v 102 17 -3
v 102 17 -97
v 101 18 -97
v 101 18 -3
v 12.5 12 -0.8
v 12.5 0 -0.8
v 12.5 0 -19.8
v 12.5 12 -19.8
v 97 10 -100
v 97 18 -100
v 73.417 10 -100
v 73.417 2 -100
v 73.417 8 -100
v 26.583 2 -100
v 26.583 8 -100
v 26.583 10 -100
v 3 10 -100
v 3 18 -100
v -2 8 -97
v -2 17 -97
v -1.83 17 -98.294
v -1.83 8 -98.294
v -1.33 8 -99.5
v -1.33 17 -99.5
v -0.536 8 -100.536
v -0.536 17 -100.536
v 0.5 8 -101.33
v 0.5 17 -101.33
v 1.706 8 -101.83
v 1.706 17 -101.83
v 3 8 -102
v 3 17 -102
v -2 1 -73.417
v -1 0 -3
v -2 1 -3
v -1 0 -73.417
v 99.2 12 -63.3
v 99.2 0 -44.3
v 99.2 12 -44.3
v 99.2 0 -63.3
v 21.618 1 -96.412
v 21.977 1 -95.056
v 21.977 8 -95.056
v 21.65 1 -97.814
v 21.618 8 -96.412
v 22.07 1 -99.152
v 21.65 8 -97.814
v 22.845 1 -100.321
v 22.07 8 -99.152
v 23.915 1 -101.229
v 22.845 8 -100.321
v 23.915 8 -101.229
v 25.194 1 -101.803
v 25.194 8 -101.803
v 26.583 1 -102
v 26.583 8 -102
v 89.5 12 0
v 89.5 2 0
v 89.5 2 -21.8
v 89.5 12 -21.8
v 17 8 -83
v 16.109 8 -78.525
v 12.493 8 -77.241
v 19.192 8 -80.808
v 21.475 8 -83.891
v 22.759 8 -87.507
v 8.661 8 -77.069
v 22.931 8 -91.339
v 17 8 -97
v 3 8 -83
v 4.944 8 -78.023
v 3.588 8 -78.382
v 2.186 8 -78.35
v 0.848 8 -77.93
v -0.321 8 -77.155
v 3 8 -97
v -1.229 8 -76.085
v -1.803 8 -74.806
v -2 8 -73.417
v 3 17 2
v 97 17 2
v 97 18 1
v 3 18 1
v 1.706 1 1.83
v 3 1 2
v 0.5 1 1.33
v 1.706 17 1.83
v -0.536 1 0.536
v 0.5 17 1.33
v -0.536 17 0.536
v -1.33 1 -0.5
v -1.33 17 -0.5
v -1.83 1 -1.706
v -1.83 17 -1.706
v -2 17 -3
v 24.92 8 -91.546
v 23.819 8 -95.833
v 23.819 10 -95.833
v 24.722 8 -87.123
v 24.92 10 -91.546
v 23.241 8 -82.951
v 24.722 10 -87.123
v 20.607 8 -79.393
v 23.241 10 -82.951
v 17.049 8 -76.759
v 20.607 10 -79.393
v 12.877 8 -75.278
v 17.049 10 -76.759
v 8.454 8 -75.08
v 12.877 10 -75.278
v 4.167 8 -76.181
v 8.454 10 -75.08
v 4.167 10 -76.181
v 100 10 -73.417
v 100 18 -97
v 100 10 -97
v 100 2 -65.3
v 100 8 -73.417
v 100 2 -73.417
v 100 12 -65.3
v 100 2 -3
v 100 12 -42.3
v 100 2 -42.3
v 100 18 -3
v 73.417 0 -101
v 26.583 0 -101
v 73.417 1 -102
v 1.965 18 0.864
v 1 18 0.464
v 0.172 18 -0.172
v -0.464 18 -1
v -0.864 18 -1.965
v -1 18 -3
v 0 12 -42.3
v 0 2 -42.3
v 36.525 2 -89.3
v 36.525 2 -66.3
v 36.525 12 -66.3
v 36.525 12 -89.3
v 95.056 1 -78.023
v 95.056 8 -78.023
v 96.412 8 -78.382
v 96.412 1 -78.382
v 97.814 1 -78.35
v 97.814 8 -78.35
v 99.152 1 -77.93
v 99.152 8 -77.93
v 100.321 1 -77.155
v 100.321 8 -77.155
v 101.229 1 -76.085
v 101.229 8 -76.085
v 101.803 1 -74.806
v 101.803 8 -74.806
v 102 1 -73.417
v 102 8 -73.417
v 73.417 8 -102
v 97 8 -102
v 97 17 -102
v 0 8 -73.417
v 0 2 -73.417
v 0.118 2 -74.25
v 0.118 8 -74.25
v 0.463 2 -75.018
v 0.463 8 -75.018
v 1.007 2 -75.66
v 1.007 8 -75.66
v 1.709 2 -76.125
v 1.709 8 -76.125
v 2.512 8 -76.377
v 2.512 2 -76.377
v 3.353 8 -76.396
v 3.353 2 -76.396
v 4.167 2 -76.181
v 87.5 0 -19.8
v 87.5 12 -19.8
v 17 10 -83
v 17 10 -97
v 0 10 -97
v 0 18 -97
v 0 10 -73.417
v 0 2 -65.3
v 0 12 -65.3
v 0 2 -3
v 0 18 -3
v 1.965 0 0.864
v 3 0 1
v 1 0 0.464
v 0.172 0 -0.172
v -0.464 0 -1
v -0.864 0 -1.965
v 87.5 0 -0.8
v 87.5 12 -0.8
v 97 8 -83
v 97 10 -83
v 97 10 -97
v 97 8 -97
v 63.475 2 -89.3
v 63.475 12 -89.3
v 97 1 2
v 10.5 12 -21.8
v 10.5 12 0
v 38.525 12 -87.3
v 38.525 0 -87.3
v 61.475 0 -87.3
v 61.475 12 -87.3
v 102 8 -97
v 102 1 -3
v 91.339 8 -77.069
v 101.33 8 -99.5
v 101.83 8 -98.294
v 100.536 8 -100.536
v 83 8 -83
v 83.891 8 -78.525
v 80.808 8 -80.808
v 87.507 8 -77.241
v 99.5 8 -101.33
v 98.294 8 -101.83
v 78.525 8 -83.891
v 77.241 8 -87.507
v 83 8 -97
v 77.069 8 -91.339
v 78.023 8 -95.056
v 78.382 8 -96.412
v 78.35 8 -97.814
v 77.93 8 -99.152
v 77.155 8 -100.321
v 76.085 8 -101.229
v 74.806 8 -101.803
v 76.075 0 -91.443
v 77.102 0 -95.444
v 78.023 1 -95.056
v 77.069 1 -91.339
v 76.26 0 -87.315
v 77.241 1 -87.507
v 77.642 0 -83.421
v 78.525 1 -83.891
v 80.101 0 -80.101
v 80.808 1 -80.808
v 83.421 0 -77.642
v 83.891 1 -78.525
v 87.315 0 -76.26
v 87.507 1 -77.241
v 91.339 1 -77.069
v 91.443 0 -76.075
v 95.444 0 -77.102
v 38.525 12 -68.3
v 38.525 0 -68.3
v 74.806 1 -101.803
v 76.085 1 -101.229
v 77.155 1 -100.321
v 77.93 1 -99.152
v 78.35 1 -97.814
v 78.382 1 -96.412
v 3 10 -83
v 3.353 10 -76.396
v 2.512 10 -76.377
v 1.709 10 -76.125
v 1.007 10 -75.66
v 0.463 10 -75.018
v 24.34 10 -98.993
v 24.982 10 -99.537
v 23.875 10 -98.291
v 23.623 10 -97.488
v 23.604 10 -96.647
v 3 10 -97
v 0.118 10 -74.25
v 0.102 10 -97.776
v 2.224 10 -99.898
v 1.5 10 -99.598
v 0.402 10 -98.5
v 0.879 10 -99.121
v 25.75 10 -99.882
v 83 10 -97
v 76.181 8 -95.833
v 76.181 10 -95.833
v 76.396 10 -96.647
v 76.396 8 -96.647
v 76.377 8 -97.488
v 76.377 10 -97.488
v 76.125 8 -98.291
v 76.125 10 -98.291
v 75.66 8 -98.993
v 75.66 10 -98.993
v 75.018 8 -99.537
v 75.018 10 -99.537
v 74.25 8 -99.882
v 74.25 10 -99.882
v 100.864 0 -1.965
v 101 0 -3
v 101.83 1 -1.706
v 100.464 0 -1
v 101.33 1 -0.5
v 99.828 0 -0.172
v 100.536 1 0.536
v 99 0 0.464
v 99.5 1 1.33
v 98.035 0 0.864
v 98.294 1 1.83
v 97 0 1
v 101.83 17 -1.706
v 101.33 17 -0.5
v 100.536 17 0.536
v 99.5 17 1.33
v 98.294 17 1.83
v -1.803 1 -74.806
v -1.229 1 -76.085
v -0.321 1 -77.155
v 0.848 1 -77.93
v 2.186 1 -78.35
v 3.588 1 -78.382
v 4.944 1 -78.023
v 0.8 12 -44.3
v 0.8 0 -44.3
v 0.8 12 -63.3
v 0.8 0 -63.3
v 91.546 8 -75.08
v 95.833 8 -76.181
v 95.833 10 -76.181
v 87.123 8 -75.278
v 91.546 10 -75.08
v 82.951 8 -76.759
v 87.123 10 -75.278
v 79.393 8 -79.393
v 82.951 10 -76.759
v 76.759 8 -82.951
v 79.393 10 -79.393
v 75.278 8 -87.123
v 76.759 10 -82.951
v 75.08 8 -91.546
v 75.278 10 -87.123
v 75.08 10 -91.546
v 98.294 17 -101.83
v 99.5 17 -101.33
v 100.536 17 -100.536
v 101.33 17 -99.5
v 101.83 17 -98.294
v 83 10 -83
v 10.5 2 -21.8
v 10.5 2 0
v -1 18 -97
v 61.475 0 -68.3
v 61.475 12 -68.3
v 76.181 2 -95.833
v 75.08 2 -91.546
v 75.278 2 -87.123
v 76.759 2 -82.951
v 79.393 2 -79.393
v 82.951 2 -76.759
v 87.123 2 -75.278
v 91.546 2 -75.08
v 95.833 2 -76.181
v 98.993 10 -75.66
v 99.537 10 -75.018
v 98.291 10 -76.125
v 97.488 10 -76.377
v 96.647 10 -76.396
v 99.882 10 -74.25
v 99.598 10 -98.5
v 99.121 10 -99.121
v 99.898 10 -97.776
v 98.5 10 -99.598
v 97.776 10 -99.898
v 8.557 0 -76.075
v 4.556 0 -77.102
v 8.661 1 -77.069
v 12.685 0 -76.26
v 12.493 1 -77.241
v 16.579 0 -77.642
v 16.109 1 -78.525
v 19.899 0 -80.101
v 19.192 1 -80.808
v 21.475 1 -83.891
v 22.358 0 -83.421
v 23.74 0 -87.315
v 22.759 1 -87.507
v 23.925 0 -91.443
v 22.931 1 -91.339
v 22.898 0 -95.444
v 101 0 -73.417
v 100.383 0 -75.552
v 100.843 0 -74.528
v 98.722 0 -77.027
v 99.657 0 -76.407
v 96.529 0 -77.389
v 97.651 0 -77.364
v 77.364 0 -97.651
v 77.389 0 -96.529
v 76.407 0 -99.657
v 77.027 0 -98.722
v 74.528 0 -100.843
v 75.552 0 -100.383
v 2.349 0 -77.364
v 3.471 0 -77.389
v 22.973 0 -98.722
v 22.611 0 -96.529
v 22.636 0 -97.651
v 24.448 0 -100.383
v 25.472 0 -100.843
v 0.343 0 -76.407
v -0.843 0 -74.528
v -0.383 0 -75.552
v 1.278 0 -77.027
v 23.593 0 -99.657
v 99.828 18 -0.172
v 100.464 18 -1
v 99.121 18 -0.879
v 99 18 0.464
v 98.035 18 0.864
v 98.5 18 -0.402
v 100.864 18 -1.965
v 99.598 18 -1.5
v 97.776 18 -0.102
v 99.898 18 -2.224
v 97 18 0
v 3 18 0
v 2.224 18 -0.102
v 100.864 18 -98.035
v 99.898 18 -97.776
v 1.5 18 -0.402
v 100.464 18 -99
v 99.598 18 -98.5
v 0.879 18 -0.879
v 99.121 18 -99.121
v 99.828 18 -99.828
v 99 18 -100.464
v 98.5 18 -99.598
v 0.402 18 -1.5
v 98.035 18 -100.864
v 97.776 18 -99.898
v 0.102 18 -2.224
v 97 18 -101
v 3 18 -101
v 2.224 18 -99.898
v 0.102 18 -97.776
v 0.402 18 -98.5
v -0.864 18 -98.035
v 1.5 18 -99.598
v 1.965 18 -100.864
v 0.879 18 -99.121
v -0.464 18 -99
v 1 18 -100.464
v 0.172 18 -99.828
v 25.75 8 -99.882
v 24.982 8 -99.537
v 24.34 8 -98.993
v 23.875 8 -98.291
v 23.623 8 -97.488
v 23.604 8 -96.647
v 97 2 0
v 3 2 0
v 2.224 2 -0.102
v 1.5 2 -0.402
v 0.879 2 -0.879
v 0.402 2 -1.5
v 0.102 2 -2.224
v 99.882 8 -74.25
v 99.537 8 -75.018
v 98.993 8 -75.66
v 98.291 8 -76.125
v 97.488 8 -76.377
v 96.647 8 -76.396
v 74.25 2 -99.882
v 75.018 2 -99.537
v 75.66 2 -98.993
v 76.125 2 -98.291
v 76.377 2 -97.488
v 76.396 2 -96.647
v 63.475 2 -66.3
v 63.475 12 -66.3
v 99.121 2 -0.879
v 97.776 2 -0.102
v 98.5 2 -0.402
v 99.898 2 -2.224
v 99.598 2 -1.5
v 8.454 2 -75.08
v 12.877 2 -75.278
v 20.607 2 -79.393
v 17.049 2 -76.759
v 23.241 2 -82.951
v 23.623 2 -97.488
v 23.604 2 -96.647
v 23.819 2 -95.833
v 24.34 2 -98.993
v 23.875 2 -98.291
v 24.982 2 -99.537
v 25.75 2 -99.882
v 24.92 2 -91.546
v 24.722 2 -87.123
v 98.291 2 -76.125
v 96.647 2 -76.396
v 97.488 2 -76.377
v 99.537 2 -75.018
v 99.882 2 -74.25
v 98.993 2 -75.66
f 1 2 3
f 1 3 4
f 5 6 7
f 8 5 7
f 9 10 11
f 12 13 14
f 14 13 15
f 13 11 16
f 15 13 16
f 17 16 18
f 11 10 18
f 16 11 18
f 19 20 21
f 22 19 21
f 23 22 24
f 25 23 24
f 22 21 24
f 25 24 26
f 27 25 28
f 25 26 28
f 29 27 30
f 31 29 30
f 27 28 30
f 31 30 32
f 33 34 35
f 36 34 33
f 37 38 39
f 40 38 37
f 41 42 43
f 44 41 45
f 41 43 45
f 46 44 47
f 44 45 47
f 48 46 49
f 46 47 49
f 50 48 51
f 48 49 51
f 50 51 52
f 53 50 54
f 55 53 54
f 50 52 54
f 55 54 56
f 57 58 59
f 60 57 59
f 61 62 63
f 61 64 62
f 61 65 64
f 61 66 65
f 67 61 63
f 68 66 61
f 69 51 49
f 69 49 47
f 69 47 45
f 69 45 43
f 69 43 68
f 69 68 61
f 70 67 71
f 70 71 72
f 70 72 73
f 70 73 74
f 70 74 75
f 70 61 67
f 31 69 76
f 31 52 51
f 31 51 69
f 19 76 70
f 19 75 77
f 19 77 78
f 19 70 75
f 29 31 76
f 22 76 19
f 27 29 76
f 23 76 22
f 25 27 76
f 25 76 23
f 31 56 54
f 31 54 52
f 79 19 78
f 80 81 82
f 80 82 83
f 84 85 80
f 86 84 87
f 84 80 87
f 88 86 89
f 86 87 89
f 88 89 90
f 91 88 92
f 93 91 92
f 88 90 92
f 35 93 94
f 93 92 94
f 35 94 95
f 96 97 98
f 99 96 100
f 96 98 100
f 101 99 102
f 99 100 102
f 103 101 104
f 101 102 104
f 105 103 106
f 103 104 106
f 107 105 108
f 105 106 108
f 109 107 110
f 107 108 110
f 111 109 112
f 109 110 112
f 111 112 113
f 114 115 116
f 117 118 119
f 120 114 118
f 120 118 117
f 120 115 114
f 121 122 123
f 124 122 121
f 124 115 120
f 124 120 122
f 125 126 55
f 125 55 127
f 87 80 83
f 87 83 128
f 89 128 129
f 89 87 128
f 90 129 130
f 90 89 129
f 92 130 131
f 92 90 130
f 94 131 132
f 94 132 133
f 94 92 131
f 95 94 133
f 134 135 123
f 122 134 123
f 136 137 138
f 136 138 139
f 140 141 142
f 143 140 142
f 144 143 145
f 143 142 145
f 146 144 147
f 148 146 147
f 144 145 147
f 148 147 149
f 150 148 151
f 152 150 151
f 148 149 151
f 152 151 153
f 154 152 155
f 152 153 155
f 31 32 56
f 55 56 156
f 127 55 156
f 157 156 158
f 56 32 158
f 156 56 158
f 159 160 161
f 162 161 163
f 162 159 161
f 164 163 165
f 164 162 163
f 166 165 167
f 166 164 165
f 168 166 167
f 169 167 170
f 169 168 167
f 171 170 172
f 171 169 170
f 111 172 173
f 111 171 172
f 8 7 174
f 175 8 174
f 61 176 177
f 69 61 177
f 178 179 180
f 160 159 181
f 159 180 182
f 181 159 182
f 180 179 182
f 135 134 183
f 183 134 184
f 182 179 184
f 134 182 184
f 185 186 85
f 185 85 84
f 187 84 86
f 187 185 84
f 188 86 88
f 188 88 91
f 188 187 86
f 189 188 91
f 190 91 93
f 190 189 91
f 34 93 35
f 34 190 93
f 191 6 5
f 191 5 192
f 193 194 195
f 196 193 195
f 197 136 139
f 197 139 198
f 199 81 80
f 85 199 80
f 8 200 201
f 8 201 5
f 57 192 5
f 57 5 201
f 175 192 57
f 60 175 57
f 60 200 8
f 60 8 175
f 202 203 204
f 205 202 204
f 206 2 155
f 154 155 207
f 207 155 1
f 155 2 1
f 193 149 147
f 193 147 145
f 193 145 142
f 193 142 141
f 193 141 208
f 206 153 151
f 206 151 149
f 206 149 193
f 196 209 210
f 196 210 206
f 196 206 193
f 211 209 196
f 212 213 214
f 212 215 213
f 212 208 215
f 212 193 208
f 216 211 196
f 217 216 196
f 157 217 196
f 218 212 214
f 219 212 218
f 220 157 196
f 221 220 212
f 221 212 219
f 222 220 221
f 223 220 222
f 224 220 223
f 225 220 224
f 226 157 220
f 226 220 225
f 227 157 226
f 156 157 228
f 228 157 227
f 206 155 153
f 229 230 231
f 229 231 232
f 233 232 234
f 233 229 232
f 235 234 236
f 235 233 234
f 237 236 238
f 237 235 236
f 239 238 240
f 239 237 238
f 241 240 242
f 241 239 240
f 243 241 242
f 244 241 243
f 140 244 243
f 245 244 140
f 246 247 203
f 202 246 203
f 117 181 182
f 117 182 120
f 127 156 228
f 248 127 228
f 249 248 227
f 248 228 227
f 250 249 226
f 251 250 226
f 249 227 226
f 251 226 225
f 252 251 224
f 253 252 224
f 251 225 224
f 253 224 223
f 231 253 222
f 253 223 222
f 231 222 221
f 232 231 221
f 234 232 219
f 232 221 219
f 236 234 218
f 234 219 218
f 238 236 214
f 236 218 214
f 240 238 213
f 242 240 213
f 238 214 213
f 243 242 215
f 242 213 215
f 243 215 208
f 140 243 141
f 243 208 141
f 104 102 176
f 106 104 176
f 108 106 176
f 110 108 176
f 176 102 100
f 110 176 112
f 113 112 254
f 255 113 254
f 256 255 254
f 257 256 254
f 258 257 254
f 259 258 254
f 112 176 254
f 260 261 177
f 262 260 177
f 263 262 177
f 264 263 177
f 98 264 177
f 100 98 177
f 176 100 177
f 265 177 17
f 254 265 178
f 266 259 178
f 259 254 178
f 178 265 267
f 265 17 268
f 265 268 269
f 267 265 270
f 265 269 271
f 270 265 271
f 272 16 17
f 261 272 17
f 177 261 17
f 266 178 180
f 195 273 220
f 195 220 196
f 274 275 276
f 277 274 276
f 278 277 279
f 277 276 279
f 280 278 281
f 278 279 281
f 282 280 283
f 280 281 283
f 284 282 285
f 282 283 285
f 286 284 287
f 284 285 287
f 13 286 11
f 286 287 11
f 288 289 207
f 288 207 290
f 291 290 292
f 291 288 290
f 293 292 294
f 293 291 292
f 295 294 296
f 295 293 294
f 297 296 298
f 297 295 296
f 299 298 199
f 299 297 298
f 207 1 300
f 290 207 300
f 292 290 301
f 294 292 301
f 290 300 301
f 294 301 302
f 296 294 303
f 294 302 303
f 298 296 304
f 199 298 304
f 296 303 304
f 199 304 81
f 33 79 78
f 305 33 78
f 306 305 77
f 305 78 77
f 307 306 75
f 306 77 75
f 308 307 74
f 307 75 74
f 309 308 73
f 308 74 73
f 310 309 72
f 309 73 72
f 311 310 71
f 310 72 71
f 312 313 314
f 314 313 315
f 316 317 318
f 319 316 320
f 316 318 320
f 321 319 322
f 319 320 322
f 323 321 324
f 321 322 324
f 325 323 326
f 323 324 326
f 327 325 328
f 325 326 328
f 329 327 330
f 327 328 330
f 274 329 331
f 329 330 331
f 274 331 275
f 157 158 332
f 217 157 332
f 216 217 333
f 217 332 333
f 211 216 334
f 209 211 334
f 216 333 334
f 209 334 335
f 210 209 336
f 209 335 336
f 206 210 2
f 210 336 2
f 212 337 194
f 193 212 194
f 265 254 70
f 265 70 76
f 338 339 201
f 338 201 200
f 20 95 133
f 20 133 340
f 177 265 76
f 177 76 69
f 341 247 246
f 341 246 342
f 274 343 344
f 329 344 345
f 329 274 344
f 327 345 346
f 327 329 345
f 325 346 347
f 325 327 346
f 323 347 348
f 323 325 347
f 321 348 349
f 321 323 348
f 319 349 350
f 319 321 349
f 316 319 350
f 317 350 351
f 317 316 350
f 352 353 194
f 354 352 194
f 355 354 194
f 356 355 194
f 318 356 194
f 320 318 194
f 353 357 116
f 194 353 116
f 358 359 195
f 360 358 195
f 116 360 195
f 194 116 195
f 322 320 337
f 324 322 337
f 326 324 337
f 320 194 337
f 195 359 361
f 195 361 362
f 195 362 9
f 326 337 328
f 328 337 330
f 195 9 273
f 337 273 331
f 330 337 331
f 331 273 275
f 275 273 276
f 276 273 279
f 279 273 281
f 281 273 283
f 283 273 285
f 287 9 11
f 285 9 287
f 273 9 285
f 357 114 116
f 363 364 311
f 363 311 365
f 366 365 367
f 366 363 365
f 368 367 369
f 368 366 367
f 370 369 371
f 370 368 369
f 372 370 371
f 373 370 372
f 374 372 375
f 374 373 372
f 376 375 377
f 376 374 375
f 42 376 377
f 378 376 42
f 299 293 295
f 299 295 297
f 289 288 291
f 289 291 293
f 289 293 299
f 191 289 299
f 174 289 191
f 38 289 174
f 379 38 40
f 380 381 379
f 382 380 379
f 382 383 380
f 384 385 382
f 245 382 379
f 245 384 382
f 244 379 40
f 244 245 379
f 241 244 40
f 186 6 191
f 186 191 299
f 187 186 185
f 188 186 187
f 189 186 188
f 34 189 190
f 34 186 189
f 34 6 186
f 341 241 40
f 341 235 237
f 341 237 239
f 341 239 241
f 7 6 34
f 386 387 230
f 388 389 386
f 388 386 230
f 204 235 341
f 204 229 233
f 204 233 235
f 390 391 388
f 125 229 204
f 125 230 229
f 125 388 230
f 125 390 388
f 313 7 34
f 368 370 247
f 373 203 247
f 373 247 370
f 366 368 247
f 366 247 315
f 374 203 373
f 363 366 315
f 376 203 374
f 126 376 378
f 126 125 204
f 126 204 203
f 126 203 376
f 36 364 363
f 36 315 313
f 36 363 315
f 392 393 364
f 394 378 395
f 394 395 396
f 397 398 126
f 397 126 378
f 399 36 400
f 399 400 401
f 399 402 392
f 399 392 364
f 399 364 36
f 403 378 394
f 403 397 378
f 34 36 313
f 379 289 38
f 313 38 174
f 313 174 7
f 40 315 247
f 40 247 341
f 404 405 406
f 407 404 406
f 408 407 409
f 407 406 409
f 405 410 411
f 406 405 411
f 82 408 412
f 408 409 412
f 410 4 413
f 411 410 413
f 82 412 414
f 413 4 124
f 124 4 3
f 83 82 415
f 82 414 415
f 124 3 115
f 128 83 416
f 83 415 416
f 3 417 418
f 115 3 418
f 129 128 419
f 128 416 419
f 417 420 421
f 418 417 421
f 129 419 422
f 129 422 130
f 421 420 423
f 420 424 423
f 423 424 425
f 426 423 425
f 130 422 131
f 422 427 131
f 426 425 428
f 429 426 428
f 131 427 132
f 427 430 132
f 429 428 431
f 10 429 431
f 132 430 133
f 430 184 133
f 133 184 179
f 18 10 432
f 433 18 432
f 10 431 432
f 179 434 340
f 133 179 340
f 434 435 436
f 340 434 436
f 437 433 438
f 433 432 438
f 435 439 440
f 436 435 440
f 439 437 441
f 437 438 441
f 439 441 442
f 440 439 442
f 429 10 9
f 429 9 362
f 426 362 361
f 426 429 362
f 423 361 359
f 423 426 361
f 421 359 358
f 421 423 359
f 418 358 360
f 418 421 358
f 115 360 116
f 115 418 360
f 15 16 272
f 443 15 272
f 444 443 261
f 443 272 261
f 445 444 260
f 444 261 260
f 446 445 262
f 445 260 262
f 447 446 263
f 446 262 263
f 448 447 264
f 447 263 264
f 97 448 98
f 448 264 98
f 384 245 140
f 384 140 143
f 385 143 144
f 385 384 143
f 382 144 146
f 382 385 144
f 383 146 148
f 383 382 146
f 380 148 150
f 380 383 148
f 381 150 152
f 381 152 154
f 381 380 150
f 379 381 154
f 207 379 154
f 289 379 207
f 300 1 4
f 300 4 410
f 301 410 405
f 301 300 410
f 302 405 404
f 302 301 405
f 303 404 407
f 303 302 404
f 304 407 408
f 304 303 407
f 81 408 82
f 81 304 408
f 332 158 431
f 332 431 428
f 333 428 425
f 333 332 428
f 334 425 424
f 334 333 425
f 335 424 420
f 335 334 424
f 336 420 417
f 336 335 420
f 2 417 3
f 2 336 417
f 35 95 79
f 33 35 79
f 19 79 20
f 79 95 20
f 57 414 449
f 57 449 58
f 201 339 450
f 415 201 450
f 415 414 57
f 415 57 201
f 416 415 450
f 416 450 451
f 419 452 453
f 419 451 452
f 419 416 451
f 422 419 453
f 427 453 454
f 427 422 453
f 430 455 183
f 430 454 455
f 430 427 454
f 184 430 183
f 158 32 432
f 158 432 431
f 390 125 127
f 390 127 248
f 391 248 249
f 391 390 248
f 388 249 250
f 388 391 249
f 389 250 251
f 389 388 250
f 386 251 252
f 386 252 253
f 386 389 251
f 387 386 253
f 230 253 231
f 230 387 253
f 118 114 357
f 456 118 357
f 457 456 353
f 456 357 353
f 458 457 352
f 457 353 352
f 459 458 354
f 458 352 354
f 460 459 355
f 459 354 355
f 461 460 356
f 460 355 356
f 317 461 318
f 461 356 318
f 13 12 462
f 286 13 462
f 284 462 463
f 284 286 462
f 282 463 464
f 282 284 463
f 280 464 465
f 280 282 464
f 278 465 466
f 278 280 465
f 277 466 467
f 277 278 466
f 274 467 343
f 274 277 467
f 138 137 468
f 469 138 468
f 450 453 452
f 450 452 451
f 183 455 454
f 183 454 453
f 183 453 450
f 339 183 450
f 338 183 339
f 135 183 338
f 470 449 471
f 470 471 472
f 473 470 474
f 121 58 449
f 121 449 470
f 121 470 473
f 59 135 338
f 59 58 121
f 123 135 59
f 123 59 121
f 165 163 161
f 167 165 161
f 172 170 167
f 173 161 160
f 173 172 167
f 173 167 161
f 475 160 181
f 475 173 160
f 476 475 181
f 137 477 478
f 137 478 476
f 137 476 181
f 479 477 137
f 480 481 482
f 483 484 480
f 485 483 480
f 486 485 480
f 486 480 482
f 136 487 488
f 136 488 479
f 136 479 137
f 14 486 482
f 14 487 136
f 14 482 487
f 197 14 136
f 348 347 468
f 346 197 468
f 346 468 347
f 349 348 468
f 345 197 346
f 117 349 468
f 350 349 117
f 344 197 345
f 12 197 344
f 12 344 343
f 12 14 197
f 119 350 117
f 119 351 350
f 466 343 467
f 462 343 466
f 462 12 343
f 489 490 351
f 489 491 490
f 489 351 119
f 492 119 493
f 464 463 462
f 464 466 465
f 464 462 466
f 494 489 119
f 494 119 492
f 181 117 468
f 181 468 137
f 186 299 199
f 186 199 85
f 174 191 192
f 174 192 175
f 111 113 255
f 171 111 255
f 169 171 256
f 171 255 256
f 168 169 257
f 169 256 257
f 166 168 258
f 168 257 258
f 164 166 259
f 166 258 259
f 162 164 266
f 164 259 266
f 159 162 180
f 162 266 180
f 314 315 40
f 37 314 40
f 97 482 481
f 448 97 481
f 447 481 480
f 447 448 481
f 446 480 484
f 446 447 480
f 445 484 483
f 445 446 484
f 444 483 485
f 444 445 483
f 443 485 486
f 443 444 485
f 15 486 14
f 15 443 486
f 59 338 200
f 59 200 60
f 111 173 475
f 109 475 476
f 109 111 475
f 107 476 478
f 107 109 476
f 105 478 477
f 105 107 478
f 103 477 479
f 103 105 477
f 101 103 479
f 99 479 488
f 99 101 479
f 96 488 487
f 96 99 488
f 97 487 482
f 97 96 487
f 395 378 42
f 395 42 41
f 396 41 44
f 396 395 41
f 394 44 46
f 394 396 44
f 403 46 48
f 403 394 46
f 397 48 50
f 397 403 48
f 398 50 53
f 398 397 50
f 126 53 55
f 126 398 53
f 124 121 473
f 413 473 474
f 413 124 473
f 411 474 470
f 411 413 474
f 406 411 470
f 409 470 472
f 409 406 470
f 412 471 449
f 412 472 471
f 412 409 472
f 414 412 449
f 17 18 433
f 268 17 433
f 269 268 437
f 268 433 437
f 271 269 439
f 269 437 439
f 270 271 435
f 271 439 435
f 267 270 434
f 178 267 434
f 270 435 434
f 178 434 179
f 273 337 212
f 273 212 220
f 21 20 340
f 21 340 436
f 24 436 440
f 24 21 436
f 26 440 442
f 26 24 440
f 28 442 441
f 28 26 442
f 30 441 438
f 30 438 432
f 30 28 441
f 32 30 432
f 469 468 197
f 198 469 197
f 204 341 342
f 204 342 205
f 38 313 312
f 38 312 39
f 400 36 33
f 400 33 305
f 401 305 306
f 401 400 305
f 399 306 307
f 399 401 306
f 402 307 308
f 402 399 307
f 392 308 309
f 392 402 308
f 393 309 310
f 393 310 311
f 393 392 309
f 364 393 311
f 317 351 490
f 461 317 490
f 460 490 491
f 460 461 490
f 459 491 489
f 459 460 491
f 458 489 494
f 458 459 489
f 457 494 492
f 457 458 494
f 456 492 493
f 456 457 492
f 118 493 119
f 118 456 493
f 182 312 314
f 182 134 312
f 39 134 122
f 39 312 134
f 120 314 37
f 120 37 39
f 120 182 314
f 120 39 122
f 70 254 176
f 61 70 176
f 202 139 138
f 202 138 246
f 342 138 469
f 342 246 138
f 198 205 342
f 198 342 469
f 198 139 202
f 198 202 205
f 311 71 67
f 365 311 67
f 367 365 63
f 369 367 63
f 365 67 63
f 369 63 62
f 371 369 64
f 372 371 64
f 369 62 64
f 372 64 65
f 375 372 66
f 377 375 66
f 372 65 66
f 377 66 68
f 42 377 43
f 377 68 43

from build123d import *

# Parameters (mm, degrees)
SKETCH_1_W          = 22.95
SKETCH_1_H          = 19
SKETCH_1_W_2        = 75
SKETCH_1_W_3        = 98.4
EXTRUDE_7_DEPTH     = 2
SKETCH_4_R          = 15
CUT_EXTRUDE_1_DEPTH = 18
FILLET_1_R          = 3
FILLET_2_R          = 3
SKETCH_1_6_W        = 26.95
SKETCH_1_6_H        = 23
SKETCH_1_6_W_2      = 22.95
SKETCH_1_6_H_2      = 19
EXTRUDE_3_DEPTH     = 12
SKETCH_1_7_W        = 102.4
SKETCH_1_7_H        = 23
SKETCH_1_7_W_2      = 98.4
SKETCH_1_7_H_2      = 19
EXTRUDE_4_DEPTH     = 12
SKETCH_1_8_W        = 79
SKETCH_1_8_H        = 23
SKETCH_1_8_W_2      = 75
SKETCH_1_8_H_2      = 19
EXTRUDE_5_DEPTH     = 12
EXTRUDE_START       = 16
EXTRUDE_7_2_DEPTH   = 18
SKETCH_11_W         = 28.583123952
SKETCH_11_H         = 28.583123952
CUT_EXTRUDE_8_DEPTH = 10
EXTRUDE_START_2     = 2
SKETCH_13_W         = 14
SKETCH_13_H         = 14
EXTRUDE_8_DEPTH     = 2
SKETCH_15_W         = 14
SKETCH_15_H         = 14
EXTRUDE_9_DEPTH     = 2
EXTRUDE_START_3     = 8
EXTRUDE_12_DEPTH    = 8
CHAMFER_1_SIZE      = 1
CHAMFER_2_SIZE      = 1


with BuildPart() as part:
    # 草图1 → Extrude 7 (new body)
    with BuildSketch(Plane(origin=(0, 0, 0), x_dir=(1, 0, 0), z_dir=(0, 1, 0))):
        with BuildLine():
            Line((3, 0), (97, 0))
            ThreePointArc((97, 0), (99.121320344, 0.878679656), (100, 3))
            Line((100, 3), (100, 97))
            ThreePointArc((100, 97), (99.121320344, 99.121320344), (97, 100))
            Line((97, 100), (3, 100))
            ThreePointArc((3, 100), (0.878679656, 99.121320344), (0, 97))
            Line((0, 97), (0, 3))
            ThreePointArc((0, 3), (0.878679656, 0.878679656), (3, 0))
        make_face()
        with Locations((50, 77.8)):
            Rectangle(SKETCH_1_W, SKETCH_1_H, mode=Mode.SUBTRACT)
        with Locations((50, 10.3)):
            Rectangle(SKETCH_1_W_2, SKETCH_1_H, mode=Mode.SUBTRACT)
        with Locations((50, 53.8)):
            Rectangle(SKETCH_1_W_3, SKETCH_1_H, mode=Mode.SUBTRACT)
    extrude(amount=EXTRUDE_7_DEPTH)

    # 草图4 → 切除-拉伸1 (cut)
    with BuildSketch(Plane(origin=(0, 2, 0), x_dir=(1, 0, 0), z_dir=(0, 1, 0))):
        with Locations((10, 90)):
            Circle(SKETCH_4_R)
        with Locations((90, 90)):
            Circle(SKETCH_4_R)
    extrude(amount=-CUT_EXTRUDE_1_DEPTH, mode=Mode.SUBTRACT)

    # 圆角1
    fillet_1_edges = [part.edges().sort_by_distance(p)[0] for p in [
        (21.180339887, 1, -100),
        (0, 1, -78.819660113),
    ]]
    fillet(fillet_1_edges, radius=FILLET_1_R)

    # 圆角2
    fillet_2_edges = [part.edges().sort_by_distance(p)[0] for p in [
        (78.819660113, 1, -100),
        (100, 1, -78.819660113),
    ]]
    fillet(fillet_2_edges, radius=FILLET_2_R)

    # 草图1<6> → 拉伸-薄壁3 (add)
    with BuildSketch(Plane(origin=(0, 0, 0), x_dir=(1, 0, 0), z_dir=(0, 1, 0))):
        with Locations((50, 77.8)):
            Rectangle(SKETCH_1_6_W, SKETCH_1_6_H)
        with Locations((50, 77.8)):
            Rectangle(SKETCH_1_6_W_2, SKETCH_1_6_H_2, mode=Mode.SUBTRACT)
    extrude(amount=EXTRUDE_3_DEPTH)

    # 草图1<7> → 拉伸-薄壁4 (add)
    with BuildSketch(Plane(origin=(0, 0, 0), x_dir=(1, 0, 0), z_dir=(0, 1, 0))):
        with Locations((50, 53.8)):
            Rectangle(SKETCH_1_7_W, SKETCH_1_7_H)
        with Locations((50, 53.8)):
            Rectangle(SKETCH_1_7_W_2, SKETCH_1_7_H_2, mode=Mode.SUBTRACT)
    extrude(amount=EXTRUDE_4_DEPTH)

    # 草图1<8> → 拉伸-薄壁5 (add)
    with BuildSketch(Plane(origin=(0, 0, 0), x_dir=(1, 0, 0), z_dir=(0, 1, 0))):
        with Locations((50, 10.3)):
            Rectangle(SKETCH_1_8_W, SKETCH_1_8_H)
        with Locations((50, 10.3)):
            Rectangle(SKETCH_1_8_W_2, SKETCH_1_8_H_2, mode=Mode.SUBTRACT)
    extrude(amount=EXTRUDE_5_DEPTH)

    # 草图10 → Extrude 7 2 (add)
    with BuildSketch(Plane(origin=(0, 2, 0), x_dir=(1, 0, 0), z_dir=(0, 1, 0)).offset(EXTRUDE_START)):
        with BuildLine():
            Line((-2, 3), (-2, 73.416876048))
            ThreePointArc((-2, 73.416876048), (0.236146008, 77.583542715), (4.944444444, 78.023299368))
            ThreePointArc((4.944444444, 78.023299368), (19.192388155, 80.807611845), (21.976700632, 95.055555556))
            ThreePointArc((21.976700632, 95.055555556), (22.416457285, 99.763853992), (26.583123952, 102))
            Line((26.583123952, 102), (73.416876048, 102))
            ThreePointArc((73.416876048, 102), (77.583542715, 99.763853992), (78.023299368, 95.055555556))
            ThreePointArc((78.023299368, 95.055555556), (80.807611845, 80.807611845), (95.055555556, 78.023299368))
            ThreePointArc((95.055555556, 78.023299368), (99.763853992, 77.583542715), (102, 73.416876048))
            Line((102, 73.416876048), (102, 3))
            ThreePointArc((102, 3), (100.535533906, -0.535533906), (97, -2))
            Line((97, -2), (3, -2))
            ThreePointArc((3, -2), (-0.535533906, -0.535533906), (-2, 3))
        make_face()
        with BuildLine():
            Line((0, 3), (0, 73.416876048))
            ThreePointArc((0, 73.416876048), (1.341687605, 75.916876048), (4.166666667, 76.18073004))
            ThreePointArc((4.166666667, 76.18073004), (20.606601718, 79.393398282), (23.81926996, 95.833333333))
            ThreePointArc((23.81926996, 95.833333333), (24.083123952, 98.658312395), (26.583123952, 100))
            Line((26.583123952, 100), (73.416876048, 100))
            ThreePointArc((73.416876048, 100), (75.916876048, 98.658312395), (76.18073004, 95.833333333))
            ThreePointArc((76.18073004, 95.833333333), (79.393398282, 79.393398282), (95.833333333, 76.18073004))
            ThreePointArc((95.833333333, 76.18073004), (98.658312395, 75.916876048), (100, 73.416876048))
            Line((100, 73.416876048), (100, 3))
            ThreePointArc((100, 3), (99.121320344, 0.878679656), (97, 0))
            Line((97, 0), (3, 0))
            ThreePointArc((3, 0), (0.878679656, 0.878679656), (0, 3))
        make_face(mode=Mode.SUBTRACT)
    extrude(amount=-EXTRUDE_7_2_DEPTH)

    # 草图11 → 切除-拉伸8 (cut)
    with BuildSketch(Plane(origin=(0, 18, 0), x_dir=(1, 0, 0), z_dir=(0, 1, 0))):
        with Locations((87.708438024, 87.708438024)):
            Rectangle(SKETCH_11_W, SKETCH_11_H)
        with Locations((12.291561976, 87.708438024)):
            Rectangle(SKETCH_11_W, SKETCH_11_H)
    extrude(amount=-CUT_EXTRUDE_8_DEPTH, mode=Mode.SUBTRACT)

    # 草图13 → 凸台-拉伸8 (add)
    with BuildSketch(Plane(origin=(0, 8, 0), x_dir=(1, 0, 0), z_dir=(0, 1, 0)).offset(EXTRUDE_START_2)):
        with BuildLine():
            Line((26.583123952, 102), (26.583123952, 100))
            ThreePointArc((26.583123952, 100), (24.083123952, 98.658312395), (23.81926996, 95.833333333))
            ThreePointArc((23.81926996, 95.833333333), (20.606601718, 79.393398282), (4.166666667, 76.18073004))
            ThreePointArc((4.166666667, 76.18073004), (1.341687605, 75.916876048), (0, 73.416876048))
            Line((0, 73.416876048), (-2, 73.416876048))
            Line((-2, 73.416876048), (-2, 97))
            ThreePointArc((-2, 97), (-0.535533906, 100.535533906), (3, 102))
            Line((3, 102), (26.583123952, 102))
        make_face()
        with Locations((10, 90)):
            Rectangle(SKETCH_13_W, SKETCH_13_H, mode=Mode.SUBTRACT)
    extrude(amount=-EXTRUDE_8_DEPTH)

    # 草图15 → 凸台-拉伸9 (add)
    with BuildSketch(Plane(origin=(0, 8, 0), x_dir=(1, 0, 0), z_dir=(0, 1, 0)).offset(EXTRUDE_START_2)):
        with BuildLine():
            Line((73.416876048, 102), (97, 102))
            ThreePointArc((97, 102), (100.535533906, 100.535533906), (102, 97))
            Line((102, 97), (102, 73.416876048))
            Line((102, 73.416876048), (100, 73.416876048))
            ThreePointArc((100, 73.416876048), (98.658312395, 75.916876048), (95.833333333, 76.18073004))
            ThreePointArc((95.833333333, 76.18073004), (79.393398282, 79.393398282), (76.18073004, 95.833333333))
            ThreePointArc((76.18073004, 95.833333333), (75.916876048, 98.658312395), (73.416876048, 100))
            Line((73.416876048, 100), (73.416876048, 102))
        make_face()
        with Locations((90, 90)):
            Rectangle(SKETCH_15_W, SKETCH_15_H, mode=Mode.SUBTRACT)
    extrude(amount=-EXTRUDE_9_DEPTH)

    # 草图18 → 凸台-拉伸12 (add)
    with BuildSketch(Plane(origin=(0, 10, 0), x_dir=(1, 0, 0), z_dir=(0, 1, 0)).offset(EXTRUDE_START_3)):
        with BuildLine():
            Line((0, 73.416876048), (-2, 73.416876048))
            Line((-2, 73.416876048), (-2, 97))
            ThreePointArc((-2, 97), (-0.535533906, 100.535533906), (3, 102))
            Line((3, 102), (26.583123952, 102))
            Line((26.583123952, 102), (26.583123952, 100))
            Line((26.583123952, 100), (3, 100))
            ThreePointArc((3, 100), (0.878679656, 99.121320344), (0, 97))
            Line((0, 97), (0, 73.416876048))
        make_face()
        with BuildLine():
            Line((73.416876048, 102), (73.416876048, 100))
            Line((73.416876048, 100), (97, 100))
            ThreePointArc((97, 100), (99.121320344, 99.121320344), (100, 97))
            Line((100, 97), (100, 73.416876048))
            Line((100, 73.416876048), (102, 73.416876048))
            Line((102, 73.416876048), (102, 97))
            ThreePointArc((102, 97), (100.535533906, 100.535533906), (97, 102))
            Line((97, 102), (73.416876048, 102))
        make_face()
    extrude(amount=-EXTRUDE_12_DEPTH)

    # 倒角1
    chamfer_1_edges = [part.edges().sort_by_distance(p)[0] for p in [
        (50, 0, 2),
        (-0.535533906, 0, 0.535533906),
        (-2, 0, -38.208438024),
        (0.236146008, 0, -77.583542715),
        (22.416457285, 0, -99.763853992),
        (50, 0, -102),
        (77.583542715, 0, -99.763853992),
        (99.763853992, 0, -77.583542715),
        (102, 0, -38.208438024),
        (100.535533906, 0, 0.535533906),
        (80.807611845, 0, -80.807611845),
        (19.192388155, 0, -80.807611845),
    ]]
    chamfer(chamfer_1_edges, length=CHAMFER_1_SIZE)

    # 倒角2
    chamfer_2_edges = [part.edges().sort_by_distance(p)[0] for p in [
        (50, 18, 2),
        (100.535533906, 18, 0.535533906),
        (102, 18, -50),
        (50, 18, -102),
        (-2, 18, -50),
        (-0.535533906, 18, 0.535533906),
        (100.535533906, 18, -100.535533906),
        (-0.535533906, 18, -100.535533906),
    ]]
    chamfer(chamfer_2_edges, length=CHAMFER_2_SIZE)


solid = part.part
